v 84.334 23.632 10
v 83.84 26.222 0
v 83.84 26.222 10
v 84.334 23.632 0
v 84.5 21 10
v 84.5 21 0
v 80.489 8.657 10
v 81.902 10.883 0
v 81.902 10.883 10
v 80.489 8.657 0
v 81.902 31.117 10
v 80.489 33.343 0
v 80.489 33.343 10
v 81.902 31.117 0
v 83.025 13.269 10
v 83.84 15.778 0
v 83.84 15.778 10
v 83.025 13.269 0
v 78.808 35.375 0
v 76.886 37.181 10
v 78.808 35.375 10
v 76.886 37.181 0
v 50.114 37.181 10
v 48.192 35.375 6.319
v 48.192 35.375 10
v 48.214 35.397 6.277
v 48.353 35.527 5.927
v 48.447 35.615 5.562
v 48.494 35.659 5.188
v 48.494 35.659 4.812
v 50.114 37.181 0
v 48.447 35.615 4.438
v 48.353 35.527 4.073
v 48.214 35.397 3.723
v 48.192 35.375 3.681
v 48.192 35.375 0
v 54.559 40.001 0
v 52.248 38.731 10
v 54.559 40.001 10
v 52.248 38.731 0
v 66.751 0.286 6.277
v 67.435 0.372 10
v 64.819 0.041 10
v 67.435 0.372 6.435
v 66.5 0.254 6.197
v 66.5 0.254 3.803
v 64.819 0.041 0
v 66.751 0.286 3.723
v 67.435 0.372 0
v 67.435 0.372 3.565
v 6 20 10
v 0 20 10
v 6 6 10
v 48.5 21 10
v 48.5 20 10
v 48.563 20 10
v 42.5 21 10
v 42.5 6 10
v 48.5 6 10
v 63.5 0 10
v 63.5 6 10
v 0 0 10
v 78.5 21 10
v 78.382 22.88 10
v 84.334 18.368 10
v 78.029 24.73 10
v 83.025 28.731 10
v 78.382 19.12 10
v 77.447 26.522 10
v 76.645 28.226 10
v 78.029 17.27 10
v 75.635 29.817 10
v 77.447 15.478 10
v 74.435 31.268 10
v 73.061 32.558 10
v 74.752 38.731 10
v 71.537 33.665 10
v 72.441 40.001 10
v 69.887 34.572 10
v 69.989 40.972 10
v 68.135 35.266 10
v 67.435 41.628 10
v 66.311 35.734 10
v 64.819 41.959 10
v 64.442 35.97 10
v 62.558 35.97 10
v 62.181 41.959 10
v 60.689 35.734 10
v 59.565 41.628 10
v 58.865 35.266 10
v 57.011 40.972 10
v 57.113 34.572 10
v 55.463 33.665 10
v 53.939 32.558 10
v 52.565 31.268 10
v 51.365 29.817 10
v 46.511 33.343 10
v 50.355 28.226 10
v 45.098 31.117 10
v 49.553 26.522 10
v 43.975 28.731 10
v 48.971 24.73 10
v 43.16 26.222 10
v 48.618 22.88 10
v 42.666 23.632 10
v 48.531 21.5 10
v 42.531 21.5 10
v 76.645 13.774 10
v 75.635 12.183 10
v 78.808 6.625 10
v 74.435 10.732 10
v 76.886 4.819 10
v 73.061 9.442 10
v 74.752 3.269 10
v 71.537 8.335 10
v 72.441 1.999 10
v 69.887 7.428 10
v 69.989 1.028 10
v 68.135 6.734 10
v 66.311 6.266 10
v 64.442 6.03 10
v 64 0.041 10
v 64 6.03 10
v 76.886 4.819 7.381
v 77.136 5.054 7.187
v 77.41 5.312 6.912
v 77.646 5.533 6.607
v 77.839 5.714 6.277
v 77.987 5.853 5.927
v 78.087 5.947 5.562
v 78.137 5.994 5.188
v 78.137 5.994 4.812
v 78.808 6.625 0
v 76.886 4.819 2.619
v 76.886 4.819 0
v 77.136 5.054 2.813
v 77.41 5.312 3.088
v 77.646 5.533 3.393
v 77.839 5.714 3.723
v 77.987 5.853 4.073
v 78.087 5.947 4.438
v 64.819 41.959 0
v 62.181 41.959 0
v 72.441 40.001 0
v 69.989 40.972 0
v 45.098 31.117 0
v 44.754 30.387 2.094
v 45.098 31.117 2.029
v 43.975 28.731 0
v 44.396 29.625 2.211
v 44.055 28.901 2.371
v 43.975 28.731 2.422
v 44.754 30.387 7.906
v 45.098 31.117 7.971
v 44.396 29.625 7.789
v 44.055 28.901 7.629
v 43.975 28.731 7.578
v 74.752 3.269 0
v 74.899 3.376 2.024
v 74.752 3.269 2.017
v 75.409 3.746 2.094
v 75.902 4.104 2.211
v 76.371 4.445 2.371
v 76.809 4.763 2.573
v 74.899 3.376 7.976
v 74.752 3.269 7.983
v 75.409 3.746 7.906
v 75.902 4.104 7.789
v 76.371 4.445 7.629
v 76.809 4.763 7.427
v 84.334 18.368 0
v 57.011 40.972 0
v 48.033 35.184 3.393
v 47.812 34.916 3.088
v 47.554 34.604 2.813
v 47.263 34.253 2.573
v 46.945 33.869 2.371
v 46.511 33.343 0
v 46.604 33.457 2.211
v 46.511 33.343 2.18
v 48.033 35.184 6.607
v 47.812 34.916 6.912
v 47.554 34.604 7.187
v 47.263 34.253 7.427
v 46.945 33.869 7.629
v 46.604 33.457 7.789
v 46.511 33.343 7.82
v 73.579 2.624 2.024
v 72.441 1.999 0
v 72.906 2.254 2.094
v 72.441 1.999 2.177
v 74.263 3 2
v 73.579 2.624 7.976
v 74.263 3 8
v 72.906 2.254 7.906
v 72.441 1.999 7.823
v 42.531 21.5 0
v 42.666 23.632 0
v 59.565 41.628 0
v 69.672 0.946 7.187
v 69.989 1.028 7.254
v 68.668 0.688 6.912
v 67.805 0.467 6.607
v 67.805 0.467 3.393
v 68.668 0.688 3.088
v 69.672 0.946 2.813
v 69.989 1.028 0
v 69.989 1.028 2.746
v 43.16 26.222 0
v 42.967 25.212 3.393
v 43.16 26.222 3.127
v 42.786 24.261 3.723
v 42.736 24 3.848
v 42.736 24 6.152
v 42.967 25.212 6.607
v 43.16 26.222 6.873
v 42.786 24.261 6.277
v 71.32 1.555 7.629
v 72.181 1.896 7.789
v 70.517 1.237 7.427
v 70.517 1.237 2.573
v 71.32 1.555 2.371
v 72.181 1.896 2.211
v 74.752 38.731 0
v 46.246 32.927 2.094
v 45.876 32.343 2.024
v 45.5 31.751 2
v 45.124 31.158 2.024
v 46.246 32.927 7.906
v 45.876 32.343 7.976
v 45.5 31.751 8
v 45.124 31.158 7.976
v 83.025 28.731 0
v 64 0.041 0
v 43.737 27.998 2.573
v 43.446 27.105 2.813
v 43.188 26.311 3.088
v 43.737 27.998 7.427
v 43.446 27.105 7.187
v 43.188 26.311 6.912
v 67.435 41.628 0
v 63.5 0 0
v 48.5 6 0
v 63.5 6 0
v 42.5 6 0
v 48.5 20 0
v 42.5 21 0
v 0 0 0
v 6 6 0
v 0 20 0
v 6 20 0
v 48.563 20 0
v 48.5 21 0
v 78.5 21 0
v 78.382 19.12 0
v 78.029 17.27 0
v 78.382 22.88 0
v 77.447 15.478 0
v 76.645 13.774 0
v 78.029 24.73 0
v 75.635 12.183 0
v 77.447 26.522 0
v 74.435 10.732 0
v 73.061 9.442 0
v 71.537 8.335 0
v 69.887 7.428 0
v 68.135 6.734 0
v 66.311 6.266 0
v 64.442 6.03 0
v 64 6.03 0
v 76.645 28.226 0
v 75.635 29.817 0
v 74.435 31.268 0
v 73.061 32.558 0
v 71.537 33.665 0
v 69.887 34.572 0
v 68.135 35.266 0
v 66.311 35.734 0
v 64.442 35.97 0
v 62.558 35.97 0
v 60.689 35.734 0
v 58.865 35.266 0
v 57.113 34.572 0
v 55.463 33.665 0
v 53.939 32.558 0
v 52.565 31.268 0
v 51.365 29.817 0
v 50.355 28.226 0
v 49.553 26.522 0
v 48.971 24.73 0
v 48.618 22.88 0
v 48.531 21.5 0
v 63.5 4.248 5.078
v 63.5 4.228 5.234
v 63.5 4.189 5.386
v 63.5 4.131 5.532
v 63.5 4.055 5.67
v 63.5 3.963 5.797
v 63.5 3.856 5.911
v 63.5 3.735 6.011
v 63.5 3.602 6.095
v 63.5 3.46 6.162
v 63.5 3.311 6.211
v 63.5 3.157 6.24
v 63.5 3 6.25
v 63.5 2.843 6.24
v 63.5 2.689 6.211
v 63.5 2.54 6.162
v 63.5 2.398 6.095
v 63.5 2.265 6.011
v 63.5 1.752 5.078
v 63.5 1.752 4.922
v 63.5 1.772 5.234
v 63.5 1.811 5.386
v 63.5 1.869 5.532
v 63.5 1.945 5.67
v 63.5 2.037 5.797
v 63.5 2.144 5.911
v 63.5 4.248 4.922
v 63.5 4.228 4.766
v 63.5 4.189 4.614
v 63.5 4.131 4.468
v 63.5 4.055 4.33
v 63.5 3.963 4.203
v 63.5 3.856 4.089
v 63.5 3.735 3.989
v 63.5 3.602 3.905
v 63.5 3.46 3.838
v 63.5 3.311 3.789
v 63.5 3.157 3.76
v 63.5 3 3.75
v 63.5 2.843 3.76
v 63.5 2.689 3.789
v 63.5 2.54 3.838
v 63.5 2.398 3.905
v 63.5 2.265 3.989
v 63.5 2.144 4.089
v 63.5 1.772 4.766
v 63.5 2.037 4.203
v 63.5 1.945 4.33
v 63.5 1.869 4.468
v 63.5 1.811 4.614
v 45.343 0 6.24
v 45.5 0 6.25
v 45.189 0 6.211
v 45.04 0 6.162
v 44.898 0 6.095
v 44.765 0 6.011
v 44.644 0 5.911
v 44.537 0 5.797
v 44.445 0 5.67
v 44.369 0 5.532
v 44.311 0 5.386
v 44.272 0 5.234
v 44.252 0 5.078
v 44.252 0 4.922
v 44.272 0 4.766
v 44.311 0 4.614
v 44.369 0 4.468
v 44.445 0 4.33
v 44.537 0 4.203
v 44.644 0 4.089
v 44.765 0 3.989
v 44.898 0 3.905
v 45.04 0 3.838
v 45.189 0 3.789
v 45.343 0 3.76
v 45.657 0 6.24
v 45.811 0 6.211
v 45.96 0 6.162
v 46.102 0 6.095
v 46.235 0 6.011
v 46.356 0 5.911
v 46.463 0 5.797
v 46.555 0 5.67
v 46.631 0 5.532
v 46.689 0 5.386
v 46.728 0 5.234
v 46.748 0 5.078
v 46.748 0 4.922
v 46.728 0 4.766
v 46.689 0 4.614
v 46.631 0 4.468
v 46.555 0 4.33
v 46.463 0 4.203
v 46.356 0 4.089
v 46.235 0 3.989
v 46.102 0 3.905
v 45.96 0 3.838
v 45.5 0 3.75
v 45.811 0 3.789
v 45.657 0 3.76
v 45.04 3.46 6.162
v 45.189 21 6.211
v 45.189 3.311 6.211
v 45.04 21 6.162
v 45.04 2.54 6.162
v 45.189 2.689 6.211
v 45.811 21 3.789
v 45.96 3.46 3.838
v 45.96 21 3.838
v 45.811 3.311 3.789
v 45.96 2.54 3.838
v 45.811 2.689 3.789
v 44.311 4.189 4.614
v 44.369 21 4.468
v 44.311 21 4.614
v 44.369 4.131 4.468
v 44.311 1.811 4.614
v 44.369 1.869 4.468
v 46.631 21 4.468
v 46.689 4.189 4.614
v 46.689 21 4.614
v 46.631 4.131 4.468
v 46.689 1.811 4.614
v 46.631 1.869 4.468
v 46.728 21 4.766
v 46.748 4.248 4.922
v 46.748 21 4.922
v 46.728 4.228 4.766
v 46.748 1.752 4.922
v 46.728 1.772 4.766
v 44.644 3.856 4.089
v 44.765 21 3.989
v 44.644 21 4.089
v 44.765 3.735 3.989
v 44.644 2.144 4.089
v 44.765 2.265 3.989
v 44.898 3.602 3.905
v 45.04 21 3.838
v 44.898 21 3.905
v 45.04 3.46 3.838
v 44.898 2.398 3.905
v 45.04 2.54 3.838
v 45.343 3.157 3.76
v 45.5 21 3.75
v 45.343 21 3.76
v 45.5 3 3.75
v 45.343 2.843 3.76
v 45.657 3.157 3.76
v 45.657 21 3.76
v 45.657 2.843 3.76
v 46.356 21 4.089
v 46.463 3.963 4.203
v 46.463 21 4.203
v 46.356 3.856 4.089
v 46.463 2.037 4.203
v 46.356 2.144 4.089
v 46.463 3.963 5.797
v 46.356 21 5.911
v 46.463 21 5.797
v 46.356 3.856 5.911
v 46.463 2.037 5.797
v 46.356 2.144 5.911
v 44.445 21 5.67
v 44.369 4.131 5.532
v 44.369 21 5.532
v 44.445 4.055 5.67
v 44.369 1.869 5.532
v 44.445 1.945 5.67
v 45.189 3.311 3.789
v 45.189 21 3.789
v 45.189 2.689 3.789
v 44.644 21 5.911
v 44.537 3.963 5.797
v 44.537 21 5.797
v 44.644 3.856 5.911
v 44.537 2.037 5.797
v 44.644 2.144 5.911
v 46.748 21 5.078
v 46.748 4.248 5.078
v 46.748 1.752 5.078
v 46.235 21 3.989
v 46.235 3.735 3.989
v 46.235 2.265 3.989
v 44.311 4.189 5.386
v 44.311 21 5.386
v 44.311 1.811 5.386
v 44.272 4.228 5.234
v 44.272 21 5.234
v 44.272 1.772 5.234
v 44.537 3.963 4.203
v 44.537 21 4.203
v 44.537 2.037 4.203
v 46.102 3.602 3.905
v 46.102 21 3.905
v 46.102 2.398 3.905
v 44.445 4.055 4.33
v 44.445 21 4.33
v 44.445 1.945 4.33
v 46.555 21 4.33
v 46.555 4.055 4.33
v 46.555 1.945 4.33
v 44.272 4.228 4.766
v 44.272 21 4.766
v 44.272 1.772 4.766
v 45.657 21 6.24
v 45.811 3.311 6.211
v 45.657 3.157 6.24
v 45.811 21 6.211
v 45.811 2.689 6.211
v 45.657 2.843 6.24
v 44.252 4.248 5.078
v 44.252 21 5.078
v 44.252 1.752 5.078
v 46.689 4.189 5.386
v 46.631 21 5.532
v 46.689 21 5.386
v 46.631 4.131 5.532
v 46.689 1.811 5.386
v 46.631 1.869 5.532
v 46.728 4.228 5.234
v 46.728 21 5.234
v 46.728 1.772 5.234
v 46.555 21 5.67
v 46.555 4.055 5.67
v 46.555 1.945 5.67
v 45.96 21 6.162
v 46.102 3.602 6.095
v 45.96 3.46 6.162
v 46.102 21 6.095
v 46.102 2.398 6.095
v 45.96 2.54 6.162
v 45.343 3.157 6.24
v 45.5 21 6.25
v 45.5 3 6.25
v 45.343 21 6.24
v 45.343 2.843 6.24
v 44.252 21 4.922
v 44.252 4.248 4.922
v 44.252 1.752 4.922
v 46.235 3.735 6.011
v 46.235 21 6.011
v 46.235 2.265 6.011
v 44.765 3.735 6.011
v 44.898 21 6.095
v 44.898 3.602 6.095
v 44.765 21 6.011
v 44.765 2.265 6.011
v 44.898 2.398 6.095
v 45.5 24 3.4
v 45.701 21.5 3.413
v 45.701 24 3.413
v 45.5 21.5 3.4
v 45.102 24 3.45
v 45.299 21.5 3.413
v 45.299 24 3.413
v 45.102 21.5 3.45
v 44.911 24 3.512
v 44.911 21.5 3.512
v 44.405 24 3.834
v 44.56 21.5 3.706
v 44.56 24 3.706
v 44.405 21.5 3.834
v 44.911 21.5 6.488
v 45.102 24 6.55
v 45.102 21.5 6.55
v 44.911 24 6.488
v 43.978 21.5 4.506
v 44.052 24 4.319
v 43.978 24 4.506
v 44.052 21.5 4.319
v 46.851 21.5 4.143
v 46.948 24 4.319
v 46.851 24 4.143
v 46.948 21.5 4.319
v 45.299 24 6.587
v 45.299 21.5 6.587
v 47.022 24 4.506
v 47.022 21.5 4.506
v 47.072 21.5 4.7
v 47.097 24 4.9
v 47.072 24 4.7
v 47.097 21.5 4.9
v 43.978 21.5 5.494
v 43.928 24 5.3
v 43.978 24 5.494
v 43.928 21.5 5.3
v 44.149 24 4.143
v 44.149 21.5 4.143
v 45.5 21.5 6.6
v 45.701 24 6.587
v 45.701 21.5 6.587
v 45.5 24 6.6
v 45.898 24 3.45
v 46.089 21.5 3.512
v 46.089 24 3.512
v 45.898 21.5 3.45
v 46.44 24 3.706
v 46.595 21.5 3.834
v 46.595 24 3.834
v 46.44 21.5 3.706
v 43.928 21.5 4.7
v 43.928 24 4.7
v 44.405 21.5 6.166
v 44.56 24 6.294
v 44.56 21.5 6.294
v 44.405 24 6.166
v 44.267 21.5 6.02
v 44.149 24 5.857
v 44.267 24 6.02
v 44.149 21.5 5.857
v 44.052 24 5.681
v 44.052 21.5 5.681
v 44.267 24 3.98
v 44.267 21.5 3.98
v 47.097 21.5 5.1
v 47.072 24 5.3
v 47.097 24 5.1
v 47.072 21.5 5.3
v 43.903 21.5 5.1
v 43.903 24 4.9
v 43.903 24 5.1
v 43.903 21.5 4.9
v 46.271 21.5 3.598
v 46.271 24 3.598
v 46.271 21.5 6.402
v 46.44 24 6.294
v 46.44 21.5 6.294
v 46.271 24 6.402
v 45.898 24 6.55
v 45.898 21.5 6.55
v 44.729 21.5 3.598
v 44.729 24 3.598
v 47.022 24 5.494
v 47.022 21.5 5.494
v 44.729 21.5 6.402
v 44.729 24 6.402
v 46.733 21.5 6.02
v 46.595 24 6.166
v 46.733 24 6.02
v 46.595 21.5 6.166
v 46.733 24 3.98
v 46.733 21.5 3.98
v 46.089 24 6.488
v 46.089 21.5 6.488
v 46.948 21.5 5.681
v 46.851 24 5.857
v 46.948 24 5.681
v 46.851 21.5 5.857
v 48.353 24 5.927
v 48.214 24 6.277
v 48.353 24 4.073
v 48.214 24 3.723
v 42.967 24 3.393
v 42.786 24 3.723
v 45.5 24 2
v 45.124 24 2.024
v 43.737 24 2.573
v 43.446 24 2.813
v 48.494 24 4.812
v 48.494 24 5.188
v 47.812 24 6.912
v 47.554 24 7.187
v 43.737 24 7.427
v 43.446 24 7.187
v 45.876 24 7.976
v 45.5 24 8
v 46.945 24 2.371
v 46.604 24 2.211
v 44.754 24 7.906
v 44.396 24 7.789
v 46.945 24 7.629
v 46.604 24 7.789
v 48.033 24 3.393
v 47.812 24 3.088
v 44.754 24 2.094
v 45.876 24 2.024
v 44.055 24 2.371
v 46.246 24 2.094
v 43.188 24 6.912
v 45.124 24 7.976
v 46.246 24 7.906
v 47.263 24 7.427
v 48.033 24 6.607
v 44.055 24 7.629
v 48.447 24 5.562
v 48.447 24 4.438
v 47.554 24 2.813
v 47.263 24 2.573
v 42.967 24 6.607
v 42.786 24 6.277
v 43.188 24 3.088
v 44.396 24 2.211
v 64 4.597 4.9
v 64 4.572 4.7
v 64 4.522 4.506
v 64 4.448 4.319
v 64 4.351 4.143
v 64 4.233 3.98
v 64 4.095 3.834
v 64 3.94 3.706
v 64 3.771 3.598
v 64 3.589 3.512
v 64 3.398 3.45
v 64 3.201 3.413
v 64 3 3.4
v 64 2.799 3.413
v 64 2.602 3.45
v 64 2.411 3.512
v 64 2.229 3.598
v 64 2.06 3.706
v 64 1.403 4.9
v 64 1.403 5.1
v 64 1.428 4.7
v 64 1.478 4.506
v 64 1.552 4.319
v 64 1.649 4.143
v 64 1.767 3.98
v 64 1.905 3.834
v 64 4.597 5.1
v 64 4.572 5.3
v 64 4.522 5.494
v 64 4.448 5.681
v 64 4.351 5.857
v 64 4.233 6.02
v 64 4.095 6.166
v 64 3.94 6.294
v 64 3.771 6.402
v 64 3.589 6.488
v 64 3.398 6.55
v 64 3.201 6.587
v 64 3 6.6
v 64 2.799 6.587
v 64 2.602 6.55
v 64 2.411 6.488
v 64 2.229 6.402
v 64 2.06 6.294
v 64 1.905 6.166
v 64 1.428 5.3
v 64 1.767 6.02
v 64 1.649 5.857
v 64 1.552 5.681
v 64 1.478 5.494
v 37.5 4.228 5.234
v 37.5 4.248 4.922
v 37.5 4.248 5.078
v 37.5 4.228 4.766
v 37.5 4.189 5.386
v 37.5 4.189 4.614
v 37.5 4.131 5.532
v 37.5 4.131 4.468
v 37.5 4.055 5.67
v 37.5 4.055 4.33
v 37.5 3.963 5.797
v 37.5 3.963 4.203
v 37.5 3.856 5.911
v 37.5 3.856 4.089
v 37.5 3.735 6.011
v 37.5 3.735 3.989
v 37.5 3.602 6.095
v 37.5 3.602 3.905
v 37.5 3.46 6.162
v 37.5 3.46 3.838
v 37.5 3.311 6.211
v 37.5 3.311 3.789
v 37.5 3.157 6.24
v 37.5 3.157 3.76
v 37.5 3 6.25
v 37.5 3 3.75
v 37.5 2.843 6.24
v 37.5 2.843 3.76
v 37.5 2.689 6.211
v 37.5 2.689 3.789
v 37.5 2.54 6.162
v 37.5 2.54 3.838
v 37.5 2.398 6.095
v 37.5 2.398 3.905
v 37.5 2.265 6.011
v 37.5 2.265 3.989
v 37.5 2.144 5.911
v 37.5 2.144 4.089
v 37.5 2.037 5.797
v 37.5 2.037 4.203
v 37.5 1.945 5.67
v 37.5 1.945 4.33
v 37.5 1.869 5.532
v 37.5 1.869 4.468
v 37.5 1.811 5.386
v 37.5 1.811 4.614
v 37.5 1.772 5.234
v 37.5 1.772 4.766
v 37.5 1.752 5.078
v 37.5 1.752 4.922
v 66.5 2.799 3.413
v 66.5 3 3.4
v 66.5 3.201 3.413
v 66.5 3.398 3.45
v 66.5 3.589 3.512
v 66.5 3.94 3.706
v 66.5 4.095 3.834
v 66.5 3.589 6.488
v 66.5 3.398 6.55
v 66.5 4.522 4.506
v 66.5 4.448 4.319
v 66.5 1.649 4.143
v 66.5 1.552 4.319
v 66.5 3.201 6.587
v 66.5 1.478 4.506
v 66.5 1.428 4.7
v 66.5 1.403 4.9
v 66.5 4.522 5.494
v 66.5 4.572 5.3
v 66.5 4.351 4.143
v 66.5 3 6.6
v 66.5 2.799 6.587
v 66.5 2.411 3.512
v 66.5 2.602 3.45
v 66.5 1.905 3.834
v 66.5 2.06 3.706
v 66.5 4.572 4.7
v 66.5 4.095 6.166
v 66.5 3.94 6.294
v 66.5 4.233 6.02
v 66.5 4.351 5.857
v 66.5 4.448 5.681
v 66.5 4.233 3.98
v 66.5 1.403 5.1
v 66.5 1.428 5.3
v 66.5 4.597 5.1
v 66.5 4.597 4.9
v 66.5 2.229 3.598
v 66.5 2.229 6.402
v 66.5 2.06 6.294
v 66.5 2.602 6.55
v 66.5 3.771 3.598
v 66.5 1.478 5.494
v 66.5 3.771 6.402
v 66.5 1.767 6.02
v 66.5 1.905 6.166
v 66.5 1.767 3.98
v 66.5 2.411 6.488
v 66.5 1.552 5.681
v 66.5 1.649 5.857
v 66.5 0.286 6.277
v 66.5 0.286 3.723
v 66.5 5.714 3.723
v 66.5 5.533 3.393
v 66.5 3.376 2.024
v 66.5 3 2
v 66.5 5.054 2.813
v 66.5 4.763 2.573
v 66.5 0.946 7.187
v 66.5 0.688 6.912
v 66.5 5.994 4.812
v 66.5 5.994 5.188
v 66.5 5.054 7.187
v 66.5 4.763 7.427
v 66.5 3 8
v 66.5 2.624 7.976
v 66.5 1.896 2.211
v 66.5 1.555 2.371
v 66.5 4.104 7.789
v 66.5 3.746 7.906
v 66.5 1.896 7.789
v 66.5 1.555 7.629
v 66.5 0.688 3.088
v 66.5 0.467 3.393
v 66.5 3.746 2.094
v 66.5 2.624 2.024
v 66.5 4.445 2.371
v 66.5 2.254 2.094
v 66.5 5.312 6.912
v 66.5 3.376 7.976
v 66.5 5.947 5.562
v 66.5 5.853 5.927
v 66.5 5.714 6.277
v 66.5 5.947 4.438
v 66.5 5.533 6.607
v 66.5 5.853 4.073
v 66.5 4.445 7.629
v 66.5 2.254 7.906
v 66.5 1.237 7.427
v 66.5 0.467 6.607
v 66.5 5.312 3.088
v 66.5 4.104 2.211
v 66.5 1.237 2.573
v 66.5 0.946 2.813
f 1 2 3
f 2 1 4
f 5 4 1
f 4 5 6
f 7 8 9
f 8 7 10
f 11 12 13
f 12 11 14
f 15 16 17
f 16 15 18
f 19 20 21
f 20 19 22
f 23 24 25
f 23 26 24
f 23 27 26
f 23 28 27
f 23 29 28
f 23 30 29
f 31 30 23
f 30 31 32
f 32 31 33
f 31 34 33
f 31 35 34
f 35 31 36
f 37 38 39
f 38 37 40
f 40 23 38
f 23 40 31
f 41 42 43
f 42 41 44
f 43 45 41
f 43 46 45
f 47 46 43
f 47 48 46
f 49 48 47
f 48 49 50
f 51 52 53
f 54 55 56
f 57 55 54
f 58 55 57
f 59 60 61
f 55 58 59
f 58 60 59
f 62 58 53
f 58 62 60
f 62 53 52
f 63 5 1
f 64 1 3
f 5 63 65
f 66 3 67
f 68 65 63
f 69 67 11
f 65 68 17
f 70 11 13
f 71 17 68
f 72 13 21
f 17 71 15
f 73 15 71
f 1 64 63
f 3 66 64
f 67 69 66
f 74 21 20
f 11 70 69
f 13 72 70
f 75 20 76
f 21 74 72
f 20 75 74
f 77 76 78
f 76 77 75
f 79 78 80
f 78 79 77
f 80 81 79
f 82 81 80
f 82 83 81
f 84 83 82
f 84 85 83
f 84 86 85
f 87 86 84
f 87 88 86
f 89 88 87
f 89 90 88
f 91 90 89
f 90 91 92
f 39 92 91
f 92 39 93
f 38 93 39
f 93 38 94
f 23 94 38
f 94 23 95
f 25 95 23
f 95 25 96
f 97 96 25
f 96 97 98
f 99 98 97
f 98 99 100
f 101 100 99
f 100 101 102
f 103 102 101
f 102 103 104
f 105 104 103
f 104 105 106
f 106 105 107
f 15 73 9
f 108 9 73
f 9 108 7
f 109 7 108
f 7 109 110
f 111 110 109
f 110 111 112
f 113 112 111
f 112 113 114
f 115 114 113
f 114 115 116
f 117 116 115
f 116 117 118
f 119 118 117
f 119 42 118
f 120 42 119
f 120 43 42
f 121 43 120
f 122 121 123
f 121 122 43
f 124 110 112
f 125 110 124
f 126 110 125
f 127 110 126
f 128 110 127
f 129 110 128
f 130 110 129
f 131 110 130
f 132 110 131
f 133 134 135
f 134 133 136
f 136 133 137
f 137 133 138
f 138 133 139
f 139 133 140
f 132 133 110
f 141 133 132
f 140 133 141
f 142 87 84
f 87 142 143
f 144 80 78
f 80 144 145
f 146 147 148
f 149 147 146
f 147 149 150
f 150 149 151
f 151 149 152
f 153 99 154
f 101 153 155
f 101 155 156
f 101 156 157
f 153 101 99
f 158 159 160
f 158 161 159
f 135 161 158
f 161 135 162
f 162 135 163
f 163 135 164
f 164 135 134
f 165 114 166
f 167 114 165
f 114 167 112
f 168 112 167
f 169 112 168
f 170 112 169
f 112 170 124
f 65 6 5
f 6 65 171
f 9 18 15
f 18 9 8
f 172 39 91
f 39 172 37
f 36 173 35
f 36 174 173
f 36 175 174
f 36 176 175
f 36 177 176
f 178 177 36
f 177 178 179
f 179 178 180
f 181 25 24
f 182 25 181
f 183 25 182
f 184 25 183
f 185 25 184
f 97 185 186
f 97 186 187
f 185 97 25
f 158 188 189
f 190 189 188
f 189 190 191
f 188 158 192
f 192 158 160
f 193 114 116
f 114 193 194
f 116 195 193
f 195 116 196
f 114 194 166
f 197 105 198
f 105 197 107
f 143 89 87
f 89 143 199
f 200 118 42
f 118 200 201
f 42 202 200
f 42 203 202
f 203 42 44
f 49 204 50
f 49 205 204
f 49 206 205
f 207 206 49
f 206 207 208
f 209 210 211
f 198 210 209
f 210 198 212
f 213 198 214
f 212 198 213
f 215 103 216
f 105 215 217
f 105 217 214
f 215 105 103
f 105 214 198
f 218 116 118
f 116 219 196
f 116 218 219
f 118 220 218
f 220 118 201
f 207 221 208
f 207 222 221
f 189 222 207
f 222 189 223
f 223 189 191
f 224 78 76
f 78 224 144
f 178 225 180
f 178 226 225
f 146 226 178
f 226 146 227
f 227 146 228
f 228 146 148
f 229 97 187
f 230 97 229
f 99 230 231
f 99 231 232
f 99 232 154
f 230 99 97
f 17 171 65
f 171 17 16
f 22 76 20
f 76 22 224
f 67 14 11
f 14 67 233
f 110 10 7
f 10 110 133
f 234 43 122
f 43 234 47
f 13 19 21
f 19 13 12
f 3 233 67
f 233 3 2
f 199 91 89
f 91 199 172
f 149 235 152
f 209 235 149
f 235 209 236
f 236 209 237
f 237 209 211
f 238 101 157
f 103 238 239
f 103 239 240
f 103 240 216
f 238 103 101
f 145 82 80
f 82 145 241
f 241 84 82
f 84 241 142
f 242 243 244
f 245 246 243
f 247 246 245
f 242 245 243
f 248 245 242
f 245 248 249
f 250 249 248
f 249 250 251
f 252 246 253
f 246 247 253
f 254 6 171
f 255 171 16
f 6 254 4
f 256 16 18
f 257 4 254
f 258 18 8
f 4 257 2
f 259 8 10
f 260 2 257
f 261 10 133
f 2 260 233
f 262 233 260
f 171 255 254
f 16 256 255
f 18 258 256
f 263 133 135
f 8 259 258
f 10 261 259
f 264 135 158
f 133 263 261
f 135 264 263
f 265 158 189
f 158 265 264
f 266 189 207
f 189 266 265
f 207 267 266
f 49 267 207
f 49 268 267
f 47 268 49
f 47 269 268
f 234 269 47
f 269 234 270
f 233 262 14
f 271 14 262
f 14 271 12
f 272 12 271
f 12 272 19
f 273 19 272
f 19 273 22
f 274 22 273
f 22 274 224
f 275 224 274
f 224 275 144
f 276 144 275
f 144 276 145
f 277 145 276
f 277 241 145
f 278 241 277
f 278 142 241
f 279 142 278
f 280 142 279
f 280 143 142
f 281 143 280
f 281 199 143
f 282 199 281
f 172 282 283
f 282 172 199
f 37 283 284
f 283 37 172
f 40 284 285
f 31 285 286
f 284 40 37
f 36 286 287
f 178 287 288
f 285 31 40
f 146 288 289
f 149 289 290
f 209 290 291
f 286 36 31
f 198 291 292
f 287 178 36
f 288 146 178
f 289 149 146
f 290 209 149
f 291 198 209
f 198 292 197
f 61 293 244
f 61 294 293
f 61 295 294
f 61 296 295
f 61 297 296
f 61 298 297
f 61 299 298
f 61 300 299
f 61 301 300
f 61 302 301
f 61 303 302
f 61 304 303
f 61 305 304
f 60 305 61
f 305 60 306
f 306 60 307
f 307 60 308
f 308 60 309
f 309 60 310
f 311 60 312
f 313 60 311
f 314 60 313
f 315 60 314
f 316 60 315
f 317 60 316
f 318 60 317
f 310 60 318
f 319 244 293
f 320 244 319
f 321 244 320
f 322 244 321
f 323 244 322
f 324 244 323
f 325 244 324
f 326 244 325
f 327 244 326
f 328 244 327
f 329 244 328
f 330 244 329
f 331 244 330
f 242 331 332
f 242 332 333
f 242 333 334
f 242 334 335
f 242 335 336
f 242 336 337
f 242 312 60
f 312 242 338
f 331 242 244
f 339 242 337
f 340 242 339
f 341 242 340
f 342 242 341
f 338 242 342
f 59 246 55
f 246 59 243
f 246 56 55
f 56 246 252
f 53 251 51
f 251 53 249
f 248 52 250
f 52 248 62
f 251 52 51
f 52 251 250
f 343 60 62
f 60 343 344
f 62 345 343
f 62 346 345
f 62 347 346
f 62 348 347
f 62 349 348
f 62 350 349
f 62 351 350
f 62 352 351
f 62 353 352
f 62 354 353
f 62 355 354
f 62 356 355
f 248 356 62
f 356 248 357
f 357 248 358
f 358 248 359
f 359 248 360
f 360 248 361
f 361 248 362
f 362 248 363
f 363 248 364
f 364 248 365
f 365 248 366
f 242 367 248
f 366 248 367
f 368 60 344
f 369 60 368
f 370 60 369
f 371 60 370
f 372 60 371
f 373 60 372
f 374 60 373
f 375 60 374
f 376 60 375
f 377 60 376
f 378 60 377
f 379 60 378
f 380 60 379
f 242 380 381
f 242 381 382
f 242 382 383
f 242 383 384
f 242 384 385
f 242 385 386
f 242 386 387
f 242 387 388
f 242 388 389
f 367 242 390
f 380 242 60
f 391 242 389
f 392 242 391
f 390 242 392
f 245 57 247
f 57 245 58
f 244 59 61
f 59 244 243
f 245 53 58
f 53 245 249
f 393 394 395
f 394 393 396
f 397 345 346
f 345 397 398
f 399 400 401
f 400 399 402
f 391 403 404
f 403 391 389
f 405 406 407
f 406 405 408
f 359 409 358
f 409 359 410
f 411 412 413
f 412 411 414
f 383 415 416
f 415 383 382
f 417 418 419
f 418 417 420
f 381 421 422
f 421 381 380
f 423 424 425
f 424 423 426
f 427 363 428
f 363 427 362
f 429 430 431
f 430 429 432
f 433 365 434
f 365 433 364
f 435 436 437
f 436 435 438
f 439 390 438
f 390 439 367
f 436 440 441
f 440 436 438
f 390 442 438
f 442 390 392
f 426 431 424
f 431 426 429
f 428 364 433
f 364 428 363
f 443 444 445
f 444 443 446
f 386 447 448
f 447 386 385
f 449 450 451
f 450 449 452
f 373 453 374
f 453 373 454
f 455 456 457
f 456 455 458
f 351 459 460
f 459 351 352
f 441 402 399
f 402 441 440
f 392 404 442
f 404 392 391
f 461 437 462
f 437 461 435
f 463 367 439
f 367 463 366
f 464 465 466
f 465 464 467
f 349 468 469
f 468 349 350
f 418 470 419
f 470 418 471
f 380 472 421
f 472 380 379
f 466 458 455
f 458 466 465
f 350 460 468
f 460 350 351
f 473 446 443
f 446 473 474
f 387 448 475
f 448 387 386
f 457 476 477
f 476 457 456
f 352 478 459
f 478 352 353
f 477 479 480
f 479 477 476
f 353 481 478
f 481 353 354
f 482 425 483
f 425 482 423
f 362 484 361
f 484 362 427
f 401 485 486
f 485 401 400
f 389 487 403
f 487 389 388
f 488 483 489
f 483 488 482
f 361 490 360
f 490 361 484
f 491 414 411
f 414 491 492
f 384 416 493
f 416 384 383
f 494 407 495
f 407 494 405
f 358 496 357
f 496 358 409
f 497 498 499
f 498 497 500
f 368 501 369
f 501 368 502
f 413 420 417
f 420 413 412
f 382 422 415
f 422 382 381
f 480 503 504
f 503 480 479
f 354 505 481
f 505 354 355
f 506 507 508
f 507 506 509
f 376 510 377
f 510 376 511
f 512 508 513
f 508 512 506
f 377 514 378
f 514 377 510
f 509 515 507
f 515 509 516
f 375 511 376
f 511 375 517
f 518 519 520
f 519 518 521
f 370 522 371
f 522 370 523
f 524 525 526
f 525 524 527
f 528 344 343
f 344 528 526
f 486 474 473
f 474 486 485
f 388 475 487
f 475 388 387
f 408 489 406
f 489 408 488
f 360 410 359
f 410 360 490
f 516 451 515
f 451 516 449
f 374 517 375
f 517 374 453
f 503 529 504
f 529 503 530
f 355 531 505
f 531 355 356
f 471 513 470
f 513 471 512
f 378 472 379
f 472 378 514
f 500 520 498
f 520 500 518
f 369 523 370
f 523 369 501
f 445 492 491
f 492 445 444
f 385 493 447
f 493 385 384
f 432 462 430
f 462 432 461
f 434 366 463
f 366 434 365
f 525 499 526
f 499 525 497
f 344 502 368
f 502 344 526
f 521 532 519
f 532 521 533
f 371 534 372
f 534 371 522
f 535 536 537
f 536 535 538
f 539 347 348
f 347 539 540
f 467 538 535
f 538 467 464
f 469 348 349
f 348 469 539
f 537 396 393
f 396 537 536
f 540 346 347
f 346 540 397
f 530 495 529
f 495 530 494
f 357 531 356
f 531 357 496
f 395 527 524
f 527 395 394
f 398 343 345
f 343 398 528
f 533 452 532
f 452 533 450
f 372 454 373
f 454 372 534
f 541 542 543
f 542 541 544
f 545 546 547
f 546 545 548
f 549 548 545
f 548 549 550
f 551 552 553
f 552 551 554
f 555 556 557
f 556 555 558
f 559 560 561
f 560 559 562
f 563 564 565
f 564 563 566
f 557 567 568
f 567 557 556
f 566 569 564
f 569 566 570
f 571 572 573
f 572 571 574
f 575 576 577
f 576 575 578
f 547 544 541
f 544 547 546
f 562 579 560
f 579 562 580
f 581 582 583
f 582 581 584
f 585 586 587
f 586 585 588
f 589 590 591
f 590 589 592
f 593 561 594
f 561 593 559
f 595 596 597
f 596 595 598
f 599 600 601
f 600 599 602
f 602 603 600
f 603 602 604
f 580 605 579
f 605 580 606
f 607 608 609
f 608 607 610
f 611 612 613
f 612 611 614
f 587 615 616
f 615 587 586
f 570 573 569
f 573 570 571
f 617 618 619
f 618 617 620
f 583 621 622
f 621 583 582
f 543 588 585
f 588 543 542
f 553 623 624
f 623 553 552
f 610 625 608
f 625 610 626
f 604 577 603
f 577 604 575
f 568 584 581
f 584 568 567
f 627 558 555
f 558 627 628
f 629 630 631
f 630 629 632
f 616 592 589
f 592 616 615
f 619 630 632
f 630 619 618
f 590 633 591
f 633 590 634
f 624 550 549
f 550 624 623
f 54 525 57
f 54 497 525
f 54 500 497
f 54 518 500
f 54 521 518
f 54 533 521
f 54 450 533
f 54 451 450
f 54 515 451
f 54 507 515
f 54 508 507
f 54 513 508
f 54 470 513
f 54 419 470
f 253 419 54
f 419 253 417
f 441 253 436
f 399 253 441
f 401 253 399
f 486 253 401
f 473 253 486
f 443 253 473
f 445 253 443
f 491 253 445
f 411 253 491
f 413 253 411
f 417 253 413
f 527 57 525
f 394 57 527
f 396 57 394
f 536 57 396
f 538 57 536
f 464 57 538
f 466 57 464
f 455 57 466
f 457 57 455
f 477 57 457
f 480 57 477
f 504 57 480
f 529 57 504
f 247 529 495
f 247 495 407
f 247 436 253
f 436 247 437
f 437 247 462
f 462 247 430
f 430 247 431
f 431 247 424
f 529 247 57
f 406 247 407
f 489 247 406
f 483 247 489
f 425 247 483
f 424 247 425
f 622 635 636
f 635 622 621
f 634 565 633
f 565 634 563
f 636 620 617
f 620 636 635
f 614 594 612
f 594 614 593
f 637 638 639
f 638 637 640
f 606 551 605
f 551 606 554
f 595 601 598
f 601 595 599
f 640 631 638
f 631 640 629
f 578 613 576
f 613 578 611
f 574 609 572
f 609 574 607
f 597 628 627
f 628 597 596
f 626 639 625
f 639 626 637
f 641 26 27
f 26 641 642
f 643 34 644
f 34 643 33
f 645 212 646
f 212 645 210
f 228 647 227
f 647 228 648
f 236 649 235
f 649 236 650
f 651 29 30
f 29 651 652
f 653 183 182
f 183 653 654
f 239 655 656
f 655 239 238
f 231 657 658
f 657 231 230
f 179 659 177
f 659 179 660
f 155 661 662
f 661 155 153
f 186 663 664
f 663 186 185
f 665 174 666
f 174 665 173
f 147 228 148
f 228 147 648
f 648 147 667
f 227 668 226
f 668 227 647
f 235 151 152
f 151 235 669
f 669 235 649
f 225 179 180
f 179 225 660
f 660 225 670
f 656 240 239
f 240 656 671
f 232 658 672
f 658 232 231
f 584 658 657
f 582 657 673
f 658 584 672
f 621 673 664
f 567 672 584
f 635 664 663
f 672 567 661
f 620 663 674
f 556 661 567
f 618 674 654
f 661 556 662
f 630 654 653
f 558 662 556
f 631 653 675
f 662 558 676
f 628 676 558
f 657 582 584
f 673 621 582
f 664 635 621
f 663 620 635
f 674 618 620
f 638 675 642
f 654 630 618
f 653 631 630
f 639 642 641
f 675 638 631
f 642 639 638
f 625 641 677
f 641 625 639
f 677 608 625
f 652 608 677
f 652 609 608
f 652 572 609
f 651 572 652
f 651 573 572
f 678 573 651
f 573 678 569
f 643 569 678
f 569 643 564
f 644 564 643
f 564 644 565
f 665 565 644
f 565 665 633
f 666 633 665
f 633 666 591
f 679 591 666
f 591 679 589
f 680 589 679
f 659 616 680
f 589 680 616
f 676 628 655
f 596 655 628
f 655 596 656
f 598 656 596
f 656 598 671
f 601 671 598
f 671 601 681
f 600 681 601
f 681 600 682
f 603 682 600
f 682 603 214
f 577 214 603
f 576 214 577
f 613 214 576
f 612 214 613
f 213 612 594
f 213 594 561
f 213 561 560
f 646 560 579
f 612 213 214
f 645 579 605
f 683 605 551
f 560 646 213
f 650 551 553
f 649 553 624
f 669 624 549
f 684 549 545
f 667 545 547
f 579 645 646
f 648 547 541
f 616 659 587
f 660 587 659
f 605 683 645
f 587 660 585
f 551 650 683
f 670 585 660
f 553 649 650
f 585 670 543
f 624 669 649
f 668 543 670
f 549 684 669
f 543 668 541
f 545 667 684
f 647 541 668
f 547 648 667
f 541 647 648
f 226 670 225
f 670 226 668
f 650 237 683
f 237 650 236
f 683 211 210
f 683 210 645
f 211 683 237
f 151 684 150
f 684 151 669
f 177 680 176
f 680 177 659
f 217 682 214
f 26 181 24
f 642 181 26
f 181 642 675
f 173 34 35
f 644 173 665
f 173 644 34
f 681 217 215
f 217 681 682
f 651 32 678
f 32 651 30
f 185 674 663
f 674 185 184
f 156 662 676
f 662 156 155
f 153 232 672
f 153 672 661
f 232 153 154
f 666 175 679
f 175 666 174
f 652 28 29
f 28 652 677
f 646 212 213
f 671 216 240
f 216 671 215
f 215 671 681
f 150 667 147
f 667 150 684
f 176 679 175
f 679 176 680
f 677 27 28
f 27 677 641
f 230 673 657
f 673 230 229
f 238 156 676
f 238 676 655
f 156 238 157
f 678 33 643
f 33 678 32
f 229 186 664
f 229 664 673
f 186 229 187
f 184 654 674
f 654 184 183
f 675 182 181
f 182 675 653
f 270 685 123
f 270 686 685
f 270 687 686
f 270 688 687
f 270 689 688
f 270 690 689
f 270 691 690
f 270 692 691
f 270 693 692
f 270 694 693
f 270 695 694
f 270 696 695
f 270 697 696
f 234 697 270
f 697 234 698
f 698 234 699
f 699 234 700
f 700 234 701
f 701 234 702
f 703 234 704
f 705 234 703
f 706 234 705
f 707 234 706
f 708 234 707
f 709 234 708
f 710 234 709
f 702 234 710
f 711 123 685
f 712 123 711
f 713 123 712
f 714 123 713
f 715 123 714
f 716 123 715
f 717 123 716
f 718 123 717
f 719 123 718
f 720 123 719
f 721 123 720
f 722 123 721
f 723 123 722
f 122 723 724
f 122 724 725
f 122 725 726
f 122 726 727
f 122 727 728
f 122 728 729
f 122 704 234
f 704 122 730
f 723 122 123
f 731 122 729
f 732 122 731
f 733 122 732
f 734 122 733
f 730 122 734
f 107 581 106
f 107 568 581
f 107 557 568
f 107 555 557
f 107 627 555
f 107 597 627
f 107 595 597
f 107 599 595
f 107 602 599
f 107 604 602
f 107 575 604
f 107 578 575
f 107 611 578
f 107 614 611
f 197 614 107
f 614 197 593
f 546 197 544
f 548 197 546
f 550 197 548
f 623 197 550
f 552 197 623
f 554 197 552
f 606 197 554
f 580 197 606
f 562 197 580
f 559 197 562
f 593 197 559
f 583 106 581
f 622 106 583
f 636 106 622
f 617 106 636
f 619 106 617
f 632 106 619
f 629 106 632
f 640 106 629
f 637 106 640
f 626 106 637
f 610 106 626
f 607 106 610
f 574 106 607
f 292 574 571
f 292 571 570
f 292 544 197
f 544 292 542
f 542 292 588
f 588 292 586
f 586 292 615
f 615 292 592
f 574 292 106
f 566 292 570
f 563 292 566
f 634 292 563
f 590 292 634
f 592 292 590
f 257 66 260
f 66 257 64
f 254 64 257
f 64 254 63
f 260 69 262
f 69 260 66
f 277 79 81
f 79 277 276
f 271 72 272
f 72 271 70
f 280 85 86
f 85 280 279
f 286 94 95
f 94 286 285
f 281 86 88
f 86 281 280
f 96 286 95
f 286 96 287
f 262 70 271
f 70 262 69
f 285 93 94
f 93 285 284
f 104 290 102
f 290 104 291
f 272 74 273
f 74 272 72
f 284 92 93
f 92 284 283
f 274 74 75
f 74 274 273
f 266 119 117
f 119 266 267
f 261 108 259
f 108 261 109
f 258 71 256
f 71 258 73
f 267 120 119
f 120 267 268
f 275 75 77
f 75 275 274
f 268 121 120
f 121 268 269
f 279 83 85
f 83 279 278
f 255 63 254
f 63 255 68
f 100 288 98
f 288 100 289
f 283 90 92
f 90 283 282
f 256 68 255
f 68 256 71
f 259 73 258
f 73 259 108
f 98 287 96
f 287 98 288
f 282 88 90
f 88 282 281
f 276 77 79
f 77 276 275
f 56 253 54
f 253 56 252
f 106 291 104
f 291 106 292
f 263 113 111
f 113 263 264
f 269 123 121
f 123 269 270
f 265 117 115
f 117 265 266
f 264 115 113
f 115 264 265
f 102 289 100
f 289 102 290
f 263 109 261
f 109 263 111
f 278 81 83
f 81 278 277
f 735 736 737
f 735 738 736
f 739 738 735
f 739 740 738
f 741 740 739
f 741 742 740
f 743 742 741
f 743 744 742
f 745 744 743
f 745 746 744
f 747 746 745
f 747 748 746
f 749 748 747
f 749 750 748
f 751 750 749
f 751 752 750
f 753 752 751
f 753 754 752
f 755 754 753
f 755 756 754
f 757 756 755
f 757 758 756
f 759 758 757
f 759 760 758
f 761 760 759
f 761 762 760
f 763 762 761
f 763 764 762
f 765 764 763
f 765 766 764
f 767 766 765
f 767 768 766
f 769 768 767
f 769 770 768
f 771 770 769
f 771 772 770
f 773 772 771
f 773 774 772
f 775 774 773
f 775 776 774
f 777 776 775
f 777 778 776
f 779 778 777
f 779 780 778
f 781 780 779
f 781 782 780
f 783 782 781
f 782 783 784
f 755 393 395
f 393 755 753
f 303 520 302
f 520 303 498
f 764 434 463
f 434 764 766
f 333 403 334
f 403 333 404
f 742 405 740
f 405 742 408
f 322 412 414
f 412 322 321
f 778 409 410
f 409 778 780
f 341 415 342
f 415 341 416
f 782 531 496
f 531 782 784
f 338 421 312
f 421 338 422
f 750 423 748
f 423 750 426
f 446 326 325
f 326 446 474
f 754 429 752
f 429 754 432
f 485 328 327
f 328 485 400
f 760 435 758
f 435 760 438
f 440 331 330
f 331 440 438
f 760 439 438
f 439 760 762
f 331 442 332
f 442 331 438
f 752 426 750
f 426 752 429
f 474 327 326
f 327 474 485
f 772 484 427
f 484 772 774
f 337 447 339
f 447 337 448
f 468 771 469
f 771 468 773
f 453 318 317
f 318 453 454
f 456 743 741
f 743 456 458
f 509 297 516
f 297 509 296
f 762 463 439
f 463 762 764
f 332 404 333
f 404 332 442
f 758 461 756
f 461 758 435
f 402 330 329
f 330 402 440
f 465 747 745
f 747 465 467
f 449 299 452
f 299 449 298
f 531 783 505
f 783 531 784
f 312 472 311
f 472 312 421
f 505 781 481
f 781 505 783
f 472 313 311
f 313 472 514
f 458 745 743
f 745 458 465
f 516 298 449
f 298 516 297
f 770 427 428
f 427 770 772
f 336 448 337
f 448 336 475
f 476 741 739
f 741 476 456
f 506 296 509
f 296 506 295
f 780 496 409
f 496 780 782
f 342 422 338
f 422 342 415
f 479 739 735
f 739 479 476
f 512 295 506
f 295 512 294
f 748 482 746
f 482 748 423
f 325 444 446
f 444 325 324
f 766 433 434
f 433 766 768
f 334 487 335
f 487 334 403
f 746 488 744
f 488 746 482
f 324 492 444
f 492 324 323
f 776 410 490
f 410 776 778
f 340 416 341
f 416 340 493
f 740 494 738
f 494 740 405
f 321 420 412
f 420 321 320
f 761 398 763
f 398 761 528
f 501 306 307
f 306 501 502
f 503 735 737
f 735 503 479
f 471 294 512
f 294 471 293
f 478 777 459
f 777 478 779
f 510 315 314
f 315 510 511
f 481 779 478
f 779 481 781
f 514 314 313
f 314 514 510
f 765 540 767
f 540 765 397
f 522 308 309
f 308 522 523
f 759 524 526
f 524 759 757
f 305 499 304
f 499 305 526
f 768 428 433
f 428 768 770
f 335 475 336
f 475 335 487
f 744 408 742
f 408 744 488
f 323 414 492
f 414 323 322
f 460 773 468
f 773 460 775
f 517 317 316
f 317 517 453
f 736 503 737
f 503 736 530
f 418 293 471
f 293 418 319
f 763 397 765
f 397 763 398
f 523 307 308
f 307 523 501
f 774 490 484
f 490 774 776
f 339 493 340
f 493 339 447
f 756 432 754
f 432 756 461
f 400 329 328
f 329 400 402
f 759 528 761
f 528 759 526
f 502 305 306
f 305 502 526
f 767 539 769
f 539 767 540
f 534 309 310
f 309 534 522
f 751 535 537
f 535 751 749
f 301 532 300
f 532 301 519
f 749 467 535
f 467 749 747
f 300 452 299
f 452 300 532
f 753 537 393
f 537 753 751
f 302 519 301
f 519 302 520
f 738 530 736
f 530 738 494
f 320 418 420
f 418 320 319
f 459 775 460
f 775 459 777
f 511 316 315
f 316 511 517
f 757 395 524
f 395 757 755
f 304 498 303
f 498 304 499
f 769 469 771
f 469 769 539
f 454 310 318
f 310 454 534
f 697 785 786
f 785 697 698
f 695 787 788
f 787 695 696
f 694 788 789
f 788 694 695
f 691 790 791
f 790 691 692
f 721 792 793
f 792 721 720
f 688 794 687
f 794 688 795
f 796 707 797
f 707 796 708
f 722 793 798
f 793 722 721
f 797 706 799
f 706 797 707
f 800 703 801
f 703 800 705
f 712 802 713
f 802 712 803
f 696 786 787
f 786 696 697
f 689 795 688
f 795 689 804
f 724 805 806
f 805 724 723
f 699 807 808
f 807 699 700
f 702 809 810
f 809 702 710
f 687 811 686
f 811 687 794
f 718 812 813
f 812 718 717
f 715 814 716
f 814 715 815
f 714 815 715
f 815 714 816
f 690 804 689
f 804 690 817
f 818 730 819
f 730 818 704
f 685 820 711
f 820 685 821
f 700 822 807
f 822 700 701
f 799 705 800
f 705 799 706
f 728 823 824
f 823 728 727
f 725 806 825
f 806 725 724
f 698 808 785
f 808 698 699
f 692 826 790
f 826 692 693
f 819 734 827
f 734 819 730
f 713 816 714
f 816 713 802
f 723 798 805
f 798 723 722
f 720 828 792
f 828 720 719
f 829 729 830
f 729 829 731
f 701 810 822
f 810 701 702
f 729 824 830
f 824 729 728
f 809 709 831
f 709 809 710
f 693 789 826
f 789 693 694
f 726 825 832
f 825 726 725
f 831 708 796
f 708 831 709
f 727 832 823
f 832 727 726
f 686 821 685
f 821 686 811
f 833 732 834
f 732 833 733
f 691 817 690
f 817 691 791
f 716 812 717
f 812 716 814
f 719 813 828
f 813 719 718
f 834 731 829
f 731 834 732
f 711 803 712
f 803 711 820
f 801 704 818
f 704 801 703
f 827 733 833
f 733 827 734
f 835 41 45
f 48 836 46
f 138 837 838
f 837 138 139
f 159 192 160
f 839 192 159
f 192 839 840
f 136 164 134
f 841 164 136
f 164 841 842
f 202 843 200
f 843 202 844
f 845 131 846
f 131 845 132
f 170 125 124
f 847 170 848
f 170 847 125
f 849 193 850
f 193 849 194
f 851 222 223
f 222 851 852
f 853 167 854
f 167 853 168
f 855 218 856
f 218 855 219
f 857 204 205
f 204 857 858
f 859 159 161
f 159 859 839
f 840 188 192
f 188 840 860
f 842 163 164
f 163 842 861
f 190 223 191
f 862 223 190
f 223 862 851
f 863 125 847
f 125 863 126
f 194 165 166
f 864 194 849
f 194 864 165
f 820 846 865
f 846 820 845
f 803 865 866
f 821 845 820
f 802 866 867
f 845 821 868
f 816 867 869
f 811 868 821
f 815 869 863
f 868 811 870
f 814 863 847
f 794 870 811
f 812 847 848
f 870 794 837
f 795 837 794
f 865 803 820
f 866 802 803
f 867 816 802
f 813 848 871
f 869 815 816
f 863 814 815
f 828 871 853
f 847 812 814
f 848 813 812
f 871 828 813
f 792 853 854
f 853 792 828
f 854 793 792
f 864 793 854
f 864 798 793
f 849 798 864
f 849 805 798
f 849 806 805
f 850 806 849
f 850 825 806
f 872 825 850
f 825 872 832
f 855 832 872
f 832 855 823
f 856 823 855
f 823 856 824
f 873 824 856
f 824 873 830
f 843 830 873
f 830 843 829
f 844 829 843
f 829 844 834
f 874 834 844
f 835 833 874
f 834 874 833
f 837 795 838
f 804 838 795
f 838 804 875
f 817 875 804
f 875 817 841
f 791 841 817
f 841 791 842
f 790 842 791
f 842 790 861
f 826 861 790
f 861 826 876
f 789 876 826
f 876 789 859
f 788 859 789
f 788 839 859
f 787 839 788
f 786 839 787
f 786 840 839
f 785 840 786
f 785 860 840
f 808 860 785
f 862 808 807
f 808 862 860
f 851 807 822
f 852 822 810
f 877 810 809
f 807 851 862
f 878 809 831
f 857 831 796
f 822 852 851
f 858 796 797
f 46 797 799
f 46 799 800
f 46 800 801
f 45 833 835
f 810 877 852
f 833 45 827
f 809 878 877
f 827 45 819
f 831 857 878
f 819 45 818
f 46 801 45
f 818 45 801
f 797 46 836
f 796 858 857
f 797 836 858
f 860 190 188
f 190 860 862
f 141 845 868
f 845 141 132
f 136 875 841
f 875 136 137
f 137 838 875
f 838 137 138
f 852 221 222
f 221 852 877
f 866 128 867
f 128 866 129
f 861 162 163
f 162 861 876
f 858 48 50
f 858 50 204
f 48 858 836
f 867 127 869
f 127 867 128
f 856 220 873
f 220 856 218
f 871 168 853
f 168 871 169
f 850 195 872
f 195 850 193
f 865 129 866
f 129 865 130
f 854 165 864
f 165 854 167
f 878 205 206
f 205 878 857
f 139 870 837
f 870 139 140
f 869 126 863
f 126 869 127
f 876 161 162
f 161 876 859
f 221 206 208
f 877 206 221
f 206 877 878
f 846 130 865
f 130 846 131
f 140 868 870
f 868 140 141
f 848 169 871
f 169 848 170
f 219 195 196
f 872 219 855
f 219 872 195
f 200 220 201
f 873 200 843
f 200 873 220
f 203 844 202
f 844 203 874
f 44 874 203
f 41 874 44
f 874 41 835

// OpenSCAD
$fn=50;

Thickness_of_shelf=36.5;
Length_of_top_segment=20;
Passage_for_cables_radius=15;
Thickness_of_structure=6;
Extrusion_height=10;

difference()
{
union()
    {
cube([Thickness_of_structure,Length_of_top_segment,Extrusion_height]);
translate([Thickness_of_shelf+Thickness_of_structure,0,0])
cube([Thickness_of_structure,Passage_for_cables_radius+Thickness_of_structure,Extrusion_height]);

translate([0,0,0])
rotate([0,0,0])
cube([Thickness_of_shelf+Passage_for_cables_radius+Thickness_of_structure*2,Thickness_of_structure,Extrusion_height]);

difference()
{
       translate([Thickness_of_shelf+Passage_for_cables_radius+Thickness_of_structure*2,Passage_for_cables_radius+Thickness_of_structure,0])
    cylinder(r=Passage_for_cables_radius+Thickness_of_structure,h=Extrusion_height);

       translate([Thickness_of_shelf+Thickness_of_structure*2,-1,-1])
      cube([Passage_for_cables_radius,Passage_for_cables_radius+Thickness_of_structure,Extrusion_height+2]);

}

    }   //Fine union

// Tagli
    translate([Thickness_of_shelf+Passage_for_cables_radius+Thickness_of_structure*2,-1,-1])
        cube([0.5,Passage_for_cables_radius,Extrusion_height+2]);
    translate([Thickness_of_shelf+Passage_for_cables_radius+Thickness_of_structure-1,Passage_for_cables_radius+Thickness_of_structure,-1])
    rotate([0,0,90])
        cube([0.5,Passage_for_cables_radius,Extrusion_height+2]);

//Foro centrale passaggio_cavi
translate([Thickness_of_shelf+Passage_for_cables_radius+Thickness_of_structure*2,Passage_for_cables_radius+Thickness_of_structure,-1])
cylinder(r=Passage_for_cables_radius,h=Extrusion_height*3,center=true);

//Fori assemblaggio
translate([Thickness_of_shelf+Passage_for_cables_radius+Thickness_of_structure-5,Thickness_of_structure/2,Extrusion_height/2])
rotate([0,90,0])
cylinder(r=1.25,h=30,center=true);

translate([Thickness_of_shelf+Passage_for_cables_radius+Thickness_of_structure*2+15,Thickness_of_structure/2,Extrusion_height/2])
rotate([0,90,0])
cylinder(r=1.6,h=30,center=true);

translate([Thickness_of_shelf+Passage_for_cables_radius+Thickness_of_structure*2+15+3,Thickness_of_structure/2,Extrusion_height/2])
rotate([0,90,0])
cylinder(r=3,h=30,center=true);

translate([Thickness_of_shelf+Thickness_of_structure*2,-Thickness_of_shelf-Thickness_of_structure,0])
union()
rotate([0,0,90])
{
translate([Thickness_of_shelf+Passage_for_cables_radius+Thickness_of_structure*2-10,Thickness_of_structure/2,Extrusion_height/2])
rotate([0,90,0])
cylinder(r=1.25,h=30,center=true);

translate([Thickness_of_shelf+Passage_for_cables_radius+Thickness_of_structure*2+15,Thickness_of_structure/2,Extrusion_height/2])
rotate([0,90,0])
cylinder(r=1.6,h=30,center=true);

translate([Thickness_of_shelf+Passage_for_cables_radius+Thickness_of_structure*2+15+3,Thickness_of_structure/2,Extrusion_height/2])
rotate([0,90,0])
cylinder(r=3,h=30,center=true);
}
}

//Shelf
*%translate([6.2,6.25,0])
cube([36,100,10]);
